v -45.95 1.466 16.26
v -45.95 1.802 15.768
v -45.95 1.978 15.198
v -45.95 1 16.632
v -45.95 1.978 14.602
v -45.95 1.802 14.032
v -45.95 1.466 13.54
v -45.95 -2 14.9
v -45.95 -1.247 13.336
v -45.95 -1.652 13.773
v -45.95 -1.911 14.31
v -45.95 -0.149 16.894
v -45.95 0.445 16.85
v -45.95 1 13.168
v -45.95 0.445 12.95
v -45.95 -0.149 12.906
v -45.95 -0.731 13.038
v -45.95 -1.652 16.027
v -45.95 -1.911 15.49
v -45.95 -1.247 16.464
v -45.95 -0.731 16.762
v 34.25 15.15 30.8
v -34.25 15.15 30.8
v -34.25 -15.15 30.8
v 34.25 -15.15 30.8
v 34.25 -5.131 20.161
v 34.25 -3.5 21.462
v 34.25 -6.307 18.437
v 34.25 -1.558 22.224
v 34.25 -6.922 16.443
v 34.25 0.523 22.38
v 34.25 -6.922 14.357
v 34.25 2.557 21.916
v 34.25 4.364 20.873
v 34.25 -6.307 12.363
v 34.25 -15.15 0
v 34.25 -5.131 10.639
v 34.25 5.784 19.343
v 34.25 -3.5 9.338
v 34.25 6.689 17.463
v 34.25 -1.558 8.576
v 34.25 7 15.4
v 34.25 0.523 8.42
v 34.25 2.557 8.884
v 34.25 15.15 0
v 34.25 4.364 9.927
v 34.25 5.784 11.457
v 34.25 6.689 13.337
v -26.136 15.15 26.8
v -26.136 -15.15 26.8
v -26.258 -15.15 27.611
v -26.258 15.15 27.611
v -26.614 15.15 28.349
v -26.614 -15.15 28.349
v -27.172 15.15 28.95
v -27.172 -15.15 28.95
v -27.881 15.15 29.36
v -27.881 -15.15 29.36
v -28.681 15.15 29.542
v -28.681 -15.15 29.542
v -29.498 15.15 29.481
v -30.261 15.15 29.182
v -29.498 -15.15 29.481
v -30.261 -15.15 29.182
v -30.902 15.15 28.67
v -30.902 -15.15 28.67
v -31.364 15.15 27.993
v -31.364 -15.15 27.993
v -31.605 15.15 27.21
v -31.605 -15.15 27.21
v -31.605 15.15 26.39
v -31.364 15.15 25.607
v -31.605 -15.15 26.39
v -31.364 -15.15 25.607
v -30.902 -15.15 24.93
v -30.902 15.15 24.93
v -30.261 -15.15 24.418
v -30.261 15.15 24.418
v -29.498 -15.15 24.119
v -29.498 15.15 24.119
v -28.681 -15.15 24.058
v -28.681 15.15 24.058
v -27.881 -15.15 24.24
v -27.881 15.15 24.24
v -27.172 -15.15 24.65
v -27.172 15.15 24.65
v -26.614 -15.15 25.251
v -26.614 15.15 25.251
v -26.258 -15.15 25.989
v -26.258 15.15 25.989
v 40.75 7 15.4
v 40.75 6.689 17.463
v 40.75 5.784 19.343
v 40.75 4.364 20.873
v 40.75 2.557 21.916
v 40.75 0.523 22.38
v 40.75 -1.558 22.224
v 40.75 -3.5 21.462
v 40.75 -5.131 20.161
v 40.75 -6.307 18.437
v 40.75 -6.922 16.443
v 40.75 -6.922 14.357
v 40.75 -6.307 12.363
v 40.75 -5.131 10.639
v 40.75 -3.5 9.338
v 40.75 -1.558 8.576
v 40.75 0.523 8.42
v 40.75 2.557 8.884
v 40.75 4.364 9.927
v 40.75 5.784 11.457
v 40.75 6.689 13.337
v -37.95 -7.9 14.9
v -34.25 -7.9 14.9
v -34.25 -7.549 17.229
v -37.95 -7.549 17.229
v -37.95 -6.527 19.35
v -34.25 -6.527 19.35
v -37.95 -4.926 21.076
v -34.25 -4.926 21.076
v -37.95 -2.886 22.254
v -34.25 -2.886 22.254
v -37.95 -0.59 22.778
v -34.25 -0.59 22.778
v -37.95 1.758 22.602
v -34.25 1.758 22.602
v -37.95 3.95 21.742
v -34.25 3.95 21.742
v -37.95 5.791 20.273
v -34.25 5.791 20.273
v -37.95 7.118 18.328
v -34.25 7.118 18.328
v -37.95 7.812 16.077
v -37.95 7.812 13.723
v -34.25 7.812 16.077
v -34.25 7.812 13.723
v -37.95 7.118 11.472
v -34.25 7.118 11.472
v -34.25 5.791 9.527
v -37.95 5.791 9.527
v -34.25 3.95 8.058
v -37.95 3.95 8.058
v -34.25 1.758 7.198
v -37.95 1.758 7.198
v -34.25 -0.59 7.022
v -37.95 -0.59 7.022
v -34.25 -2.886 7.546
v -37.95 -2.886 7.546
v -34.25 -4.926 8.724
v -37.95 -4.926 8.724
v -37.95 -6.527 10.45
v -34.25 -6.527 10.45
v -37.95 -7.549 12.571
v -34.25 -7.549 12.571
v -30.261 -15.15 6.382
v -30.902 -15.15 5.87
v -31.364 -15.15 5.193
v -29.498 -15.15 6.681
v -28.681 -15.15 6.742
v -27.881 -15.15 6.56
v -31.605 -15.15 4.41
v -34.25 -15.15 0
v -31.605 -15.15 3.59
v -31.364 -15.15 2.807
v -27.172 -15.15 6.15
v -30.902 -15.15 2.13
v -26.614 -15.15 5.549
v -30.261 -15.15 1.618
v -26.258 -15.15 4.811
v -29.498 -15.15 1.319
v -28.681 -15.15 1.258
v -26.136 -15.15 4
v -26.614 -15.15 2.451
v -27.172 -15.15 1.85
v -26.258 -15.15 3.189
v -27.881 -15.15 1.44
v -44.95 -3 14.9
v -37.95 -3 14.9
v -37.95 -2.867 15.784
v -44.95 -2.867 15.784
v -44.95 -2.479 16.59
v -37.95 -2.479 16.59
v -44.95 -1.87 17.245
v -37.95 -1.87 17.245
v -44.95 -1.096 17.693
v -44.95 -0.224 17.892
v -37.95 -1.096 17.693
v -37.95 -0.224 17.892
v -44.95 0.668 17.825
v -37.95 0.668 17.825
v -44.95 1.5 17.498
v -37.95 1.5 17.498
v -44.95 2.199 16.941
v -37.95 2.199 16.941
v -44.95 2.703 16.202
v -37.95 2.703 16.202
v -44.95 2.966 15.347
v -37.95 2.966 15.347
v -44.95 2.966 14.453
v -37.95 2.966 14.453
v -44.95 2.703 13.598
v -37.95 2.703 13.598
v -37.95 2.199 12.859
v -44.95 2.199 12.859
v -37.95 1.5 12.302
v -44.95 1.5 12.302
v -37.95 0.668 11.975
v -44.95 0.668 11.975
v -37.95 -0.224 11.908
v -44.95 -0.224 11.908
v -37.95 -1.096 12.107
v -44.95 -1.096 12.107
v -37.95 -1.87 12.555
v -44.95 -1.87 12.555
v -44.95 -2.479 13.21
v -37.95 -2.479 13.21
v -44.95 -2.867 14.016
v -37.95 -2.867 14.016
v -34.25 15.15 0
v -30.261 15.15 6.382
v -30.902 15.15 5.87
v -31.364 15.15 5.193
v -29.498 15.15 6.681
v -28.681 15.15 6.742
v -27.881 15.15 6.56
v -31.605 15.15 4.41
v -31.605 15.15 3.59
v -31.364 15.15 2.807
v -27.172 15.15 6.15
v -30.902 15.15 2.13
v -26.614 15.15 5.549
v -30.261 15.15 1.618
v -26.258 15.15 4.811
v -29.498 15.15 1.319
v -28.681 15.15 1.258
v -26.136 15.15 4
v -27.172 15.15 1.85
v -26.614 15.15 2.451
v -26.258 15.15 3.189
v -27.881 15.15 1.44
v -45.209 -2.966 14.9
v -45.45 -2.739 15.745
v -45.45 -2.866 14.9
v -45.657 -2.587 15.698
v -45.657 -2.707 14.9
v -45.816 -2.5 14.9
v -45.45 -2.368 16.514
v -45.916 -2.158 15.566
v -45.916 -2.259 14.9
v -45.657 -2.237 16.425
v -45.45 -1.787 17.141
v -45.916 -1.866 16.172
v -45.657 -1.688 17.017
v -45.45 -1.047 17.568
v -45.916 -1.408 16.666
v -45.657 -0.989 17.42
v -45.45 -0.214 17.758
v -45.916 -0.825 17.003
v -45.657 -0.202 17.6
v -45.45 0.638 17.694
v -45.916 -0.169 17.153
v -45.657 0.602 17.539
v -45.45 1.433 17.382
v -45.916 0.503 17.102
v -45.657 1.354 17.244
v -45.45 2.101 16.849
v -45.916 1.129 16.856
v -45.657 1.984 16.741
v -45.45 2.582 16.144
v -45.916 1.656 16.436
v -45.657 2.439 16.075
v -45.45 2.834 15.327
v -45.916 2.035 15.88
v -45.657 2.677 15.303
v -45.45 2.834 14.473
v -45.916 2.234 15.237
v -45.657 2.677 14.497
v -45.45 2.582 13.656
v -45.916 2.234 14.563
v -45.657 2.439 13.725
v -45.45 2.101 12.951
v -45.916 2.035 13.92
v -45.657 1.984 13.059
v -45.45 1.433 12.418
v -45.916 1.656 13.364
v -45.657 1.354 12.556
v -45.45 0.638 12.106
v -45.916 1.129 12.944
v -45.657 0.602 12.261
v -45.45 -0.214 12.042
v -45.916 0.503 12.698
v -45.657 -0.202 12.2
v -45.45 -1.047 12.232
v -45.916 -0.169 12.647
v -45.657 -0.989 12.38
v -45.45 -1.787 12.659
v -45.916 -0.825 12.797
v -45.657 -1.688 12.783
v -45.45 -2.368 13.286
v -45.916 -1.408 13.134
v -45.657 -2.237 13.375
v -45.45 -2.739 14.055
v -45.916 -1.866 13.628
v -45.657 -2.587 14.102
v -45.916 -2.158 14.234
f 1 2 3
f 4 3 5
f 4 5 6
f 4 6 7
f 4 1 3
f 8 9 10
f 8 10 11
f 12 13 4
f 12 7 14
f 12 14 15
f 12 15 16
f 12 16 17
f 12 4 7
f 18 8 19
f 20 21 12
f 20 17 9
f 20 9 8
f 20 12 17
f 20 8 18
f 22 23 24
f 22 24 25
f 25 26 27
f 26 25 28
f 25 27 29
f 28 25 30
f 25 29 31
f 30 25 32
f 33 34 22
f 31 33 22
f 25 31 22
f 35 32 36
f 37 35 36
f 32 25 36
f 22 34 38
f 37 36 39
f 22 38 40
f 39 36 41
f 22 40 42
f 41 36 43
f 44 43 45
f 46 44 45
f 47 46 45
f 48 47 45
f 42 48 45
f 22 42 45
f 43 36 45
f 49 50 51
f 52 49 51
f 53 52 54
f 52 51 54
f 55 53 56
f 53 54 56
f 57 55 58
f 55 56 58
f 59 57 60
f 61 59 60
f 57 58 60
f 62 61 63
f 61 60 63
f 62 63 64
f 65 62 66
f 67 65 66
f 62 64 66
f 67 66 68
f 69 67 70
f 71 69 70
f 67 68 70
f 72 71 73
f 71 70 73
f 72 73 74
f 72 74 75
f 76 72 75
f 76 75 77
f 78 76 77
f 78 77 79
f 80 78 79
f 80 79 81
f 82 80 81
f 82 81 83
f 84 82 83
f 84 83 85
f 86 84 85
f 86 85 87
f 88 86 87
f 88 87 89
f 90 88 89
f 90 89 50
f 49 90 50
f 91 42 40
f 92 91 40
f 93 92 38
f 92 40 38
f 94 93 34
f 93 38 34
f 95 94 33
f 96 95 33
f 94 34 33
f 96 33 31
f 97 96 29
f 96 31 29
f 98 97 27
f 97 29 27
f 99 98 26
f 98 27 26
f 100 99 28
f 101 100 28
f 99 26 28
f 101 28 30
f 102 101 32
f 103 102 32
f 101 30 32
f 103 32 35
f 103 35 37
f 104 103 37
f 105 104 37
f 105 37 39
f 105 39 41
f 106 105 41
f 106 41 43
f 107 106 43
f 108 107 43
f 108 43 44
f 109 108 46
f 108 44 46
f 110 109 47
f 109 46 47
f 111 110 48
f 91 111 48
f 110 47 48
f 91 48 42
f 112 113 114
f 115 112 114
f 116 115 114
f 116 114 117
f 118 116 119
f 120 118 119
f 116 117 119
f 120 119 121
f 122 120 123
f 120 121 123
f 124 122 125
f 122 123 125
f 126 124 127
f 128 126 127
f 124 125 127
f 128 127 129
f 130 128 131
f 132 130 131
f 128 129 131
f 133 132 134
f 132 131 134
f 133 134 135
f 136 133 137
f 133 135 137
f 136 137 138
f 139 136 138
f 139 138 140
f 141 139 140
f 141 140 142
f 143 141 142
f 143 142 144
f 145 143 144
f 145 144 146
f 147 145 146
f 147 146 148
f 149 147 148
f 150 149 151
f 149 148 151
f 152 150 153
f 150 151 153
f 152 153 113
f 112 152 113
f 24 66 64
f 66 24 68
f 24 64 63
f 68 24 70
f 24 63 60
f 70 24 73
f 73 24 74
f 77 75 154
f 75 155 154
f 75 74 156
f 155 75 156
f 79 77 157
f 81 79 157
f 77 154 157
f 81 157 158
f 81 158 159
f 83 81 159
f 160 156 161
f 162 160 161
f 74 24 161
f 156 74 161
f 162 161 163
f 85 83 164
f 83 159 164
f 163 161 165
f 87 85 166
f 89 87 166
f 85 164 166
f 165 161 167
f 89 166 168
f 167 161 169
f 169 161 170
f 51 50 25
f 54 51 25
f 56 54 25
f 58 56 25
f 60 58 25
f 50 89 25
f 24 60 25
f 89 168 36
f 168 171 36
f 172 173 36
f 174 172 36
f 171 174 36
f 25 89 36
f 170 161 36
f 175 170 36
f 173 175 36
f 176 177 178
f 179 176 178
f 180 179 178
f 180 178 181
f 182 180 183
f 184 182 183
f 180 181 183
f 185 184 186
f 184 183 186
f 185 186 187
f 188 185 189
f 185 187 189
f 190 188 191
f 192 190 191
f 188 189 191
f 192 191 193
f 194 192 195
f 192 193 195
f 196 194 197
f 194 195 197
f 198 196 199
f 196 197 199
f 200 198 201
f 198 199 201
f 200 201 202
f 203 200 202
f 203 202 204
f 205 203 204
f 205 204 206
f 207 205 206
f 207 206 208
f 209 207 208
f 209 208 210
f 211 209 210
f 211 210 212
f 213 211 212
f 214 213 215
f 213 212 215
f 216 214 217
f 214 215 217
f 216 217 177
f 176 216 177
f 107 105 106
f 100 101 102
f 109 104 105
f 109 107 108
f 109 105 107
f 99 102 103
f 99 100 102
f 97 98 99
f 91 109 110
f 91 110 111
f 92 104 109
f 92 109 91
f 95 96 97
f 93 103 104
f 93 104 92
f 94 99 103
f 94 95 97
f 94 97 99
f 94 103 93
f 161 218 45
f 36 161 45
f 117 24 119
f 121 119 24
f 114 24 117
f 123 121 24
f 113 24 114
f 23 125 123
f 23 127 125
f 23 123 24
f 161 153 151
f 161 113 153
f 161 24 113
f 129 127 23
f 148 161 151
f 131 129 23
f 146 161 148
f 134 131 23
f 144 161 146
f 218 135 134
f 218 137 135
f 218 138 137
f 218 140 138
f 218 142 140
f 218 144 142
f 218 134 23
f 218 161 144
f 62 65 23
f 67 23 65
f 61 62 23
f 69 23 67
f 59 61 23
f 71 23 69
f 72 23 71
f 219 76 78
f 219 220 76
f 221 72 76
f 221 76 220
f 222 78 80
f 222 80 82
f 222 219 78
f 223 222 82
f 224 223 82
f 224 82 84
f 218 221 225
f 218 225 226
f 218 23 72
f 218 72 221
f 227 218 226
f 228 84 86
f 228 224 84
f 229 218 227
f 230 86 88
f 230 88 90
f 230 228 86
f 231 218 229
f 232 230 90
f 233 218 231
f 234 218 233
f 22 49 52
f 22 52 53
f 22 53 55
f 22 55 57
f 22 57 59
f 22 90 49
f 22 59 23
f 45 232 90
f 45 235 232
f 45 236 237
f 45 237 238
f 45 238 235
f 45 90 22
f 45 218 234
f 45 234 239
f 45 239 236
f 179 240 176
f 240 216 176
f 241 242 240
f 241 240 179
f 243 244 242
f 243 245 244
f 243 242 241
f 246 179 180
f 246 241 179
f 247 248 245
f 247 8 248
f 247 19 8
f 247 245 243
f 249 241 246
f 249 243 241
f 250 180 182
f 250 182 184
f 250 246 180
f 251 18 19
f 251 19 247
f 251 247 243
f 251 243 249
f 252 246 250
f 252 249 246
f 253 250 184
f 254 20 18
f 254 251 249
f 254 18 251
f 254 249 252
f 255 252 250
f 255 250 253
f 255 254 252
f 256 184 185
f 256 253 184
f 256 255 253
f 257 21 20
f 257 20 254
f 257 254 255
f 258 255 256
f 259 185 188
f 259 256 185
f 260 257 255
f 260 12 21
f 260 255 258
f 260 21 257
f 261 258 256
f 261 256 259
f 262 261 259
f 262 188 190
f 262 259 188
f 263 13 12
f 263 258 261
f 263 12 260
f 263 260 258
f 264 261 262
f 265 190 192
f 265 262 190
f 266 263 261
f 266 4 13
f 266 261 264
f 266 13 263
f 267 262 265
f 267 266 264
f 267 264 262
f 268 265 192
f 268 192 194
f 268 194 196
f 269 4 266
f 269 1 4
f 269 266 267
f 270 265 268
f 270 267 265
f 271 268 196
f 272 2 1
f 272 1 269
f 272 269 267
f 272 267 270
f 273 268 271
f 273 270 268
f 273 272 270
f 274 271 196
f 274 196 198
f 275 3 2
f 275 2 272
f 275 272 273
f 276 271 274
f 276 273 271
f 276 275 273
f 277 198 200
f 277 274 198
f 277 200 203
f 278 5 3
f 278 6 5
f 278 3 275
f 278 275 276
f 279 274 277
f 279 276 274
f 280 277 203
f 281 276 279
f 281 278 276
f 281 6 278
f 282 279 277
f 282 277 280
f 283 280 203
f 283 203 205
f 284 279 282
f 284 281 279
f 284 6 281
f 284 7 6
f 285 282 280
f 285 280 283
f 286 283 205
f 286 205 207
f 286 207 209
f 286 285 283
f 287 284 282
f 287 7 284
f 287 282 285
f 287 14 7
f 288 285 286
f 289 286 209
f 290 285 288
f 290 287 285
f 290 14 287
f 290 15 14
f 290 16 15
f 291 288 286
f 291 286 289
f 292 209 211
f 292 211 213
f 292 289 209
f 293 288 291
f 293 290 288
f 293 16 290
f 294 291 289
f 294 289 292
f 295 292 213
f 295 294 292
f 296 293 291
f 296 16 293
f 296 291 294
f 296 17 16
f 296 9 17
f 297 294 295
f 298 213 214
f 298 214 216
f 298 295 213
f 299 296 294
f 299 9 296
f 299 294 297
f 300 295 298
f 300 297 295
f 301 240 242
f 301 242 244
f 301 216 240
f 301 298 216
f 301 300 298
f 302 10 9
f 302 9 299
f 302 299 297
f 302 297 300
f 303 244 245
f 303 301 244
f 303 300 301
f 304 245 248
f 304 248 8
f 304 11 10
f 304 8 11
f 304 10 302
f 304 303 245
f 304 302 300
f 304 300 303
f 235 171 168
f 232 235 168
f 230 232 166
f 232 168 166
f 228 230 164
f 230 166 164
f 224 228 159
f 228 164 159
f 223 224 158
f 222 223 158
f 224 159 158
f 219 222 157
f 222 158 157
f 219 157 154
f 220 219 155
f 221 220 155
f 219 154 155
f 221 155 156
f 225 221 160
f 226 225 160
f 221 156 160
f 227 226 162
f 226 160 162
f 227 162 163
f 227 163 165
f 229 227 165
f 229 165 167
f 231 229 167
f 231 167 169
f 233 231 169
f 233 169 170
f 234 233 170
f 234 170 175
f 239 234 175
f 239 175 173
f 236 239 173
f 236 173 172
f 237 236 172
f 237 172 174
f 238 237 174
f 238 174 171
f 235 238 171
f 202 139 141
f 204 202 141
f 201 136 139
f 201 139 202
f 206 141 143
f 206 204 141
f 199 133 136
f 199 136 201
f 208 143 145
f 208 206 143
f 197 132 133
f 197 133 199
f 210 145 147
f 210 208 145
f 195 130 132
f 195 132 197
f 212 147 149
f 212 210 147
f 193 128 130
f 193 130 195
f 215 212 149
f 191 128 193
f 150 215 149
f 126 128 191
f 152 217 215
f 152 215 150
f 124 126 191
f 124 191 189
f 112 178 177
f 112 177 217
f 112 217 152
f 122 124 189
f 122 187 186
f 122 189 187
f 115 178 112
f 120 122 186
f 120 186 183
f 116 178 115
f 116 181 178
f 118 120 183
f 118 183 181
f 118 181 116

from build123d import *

# Parameters (mm, degrees)
F0_W     = 68.5
F0_H     = 30.3
F1_DEPTH = 30.8
F2_R     = 7.9
F3_DEPTH = 3.7
F4_R     = 7
F5_DEPTH = 6.5
F7_D     = 5.5
F8_R     = 3
F9_DEPTH = 8
F10_R    = 1


with BuildPart() as f1:
    # F0 (on Top) → F1 (new body)
    with BuildSketch(Plane.XY):
        Rectangle(F0_W, F0_H)
    extrude(amount=F1_DEPTH)

    # F2 (on face) → F3 (join)
    with BuildSketch(Plane(origin=(-34.25, 0, 0), x_dir=(0, -1, 0), z_dir=(-1, 0, 0))):
        with Locations((0, 14.9)):
            Circle(F2_R)
    extrude(amount=F3_DEPTH)

    # F4 (on face) → F5 (join)
    with BuildSketch(Plane.YZ.offset(34.25)):
        with Locations((0, 15.4)):
            Circle(F4_R)
    extrude(amount=F5_DEPTH)

    # F7 (through all)
    with Locations(Plane(origin=(0, 15.15, 0), x_dir=(-1, 0, 0), z_dir=(0, 1, 0))):
        with Locations((28.8861435714, 26.8), (28.8861435714, 4)):
            Hole(F7_D / 2)

    # F8 (on face) → F9 (join)
    with BuildSketch(Plane(origin=(-37.95, 0, 0), x_dir=(0, -1, 0), z_dir=(-1, 0, 0))):
        with Locations((0, 14.9)):
            Circle(F8_R)
    extrude(amount=F9_DEPTH)

    # F10
    f10_edges = [f1.edges().sort_by_distance(p)[0] for p in [
        (-45.95, 3, 14.9),
    ]]
    fillet(f10_edges, radius=F10_R)


solid = f1.part
